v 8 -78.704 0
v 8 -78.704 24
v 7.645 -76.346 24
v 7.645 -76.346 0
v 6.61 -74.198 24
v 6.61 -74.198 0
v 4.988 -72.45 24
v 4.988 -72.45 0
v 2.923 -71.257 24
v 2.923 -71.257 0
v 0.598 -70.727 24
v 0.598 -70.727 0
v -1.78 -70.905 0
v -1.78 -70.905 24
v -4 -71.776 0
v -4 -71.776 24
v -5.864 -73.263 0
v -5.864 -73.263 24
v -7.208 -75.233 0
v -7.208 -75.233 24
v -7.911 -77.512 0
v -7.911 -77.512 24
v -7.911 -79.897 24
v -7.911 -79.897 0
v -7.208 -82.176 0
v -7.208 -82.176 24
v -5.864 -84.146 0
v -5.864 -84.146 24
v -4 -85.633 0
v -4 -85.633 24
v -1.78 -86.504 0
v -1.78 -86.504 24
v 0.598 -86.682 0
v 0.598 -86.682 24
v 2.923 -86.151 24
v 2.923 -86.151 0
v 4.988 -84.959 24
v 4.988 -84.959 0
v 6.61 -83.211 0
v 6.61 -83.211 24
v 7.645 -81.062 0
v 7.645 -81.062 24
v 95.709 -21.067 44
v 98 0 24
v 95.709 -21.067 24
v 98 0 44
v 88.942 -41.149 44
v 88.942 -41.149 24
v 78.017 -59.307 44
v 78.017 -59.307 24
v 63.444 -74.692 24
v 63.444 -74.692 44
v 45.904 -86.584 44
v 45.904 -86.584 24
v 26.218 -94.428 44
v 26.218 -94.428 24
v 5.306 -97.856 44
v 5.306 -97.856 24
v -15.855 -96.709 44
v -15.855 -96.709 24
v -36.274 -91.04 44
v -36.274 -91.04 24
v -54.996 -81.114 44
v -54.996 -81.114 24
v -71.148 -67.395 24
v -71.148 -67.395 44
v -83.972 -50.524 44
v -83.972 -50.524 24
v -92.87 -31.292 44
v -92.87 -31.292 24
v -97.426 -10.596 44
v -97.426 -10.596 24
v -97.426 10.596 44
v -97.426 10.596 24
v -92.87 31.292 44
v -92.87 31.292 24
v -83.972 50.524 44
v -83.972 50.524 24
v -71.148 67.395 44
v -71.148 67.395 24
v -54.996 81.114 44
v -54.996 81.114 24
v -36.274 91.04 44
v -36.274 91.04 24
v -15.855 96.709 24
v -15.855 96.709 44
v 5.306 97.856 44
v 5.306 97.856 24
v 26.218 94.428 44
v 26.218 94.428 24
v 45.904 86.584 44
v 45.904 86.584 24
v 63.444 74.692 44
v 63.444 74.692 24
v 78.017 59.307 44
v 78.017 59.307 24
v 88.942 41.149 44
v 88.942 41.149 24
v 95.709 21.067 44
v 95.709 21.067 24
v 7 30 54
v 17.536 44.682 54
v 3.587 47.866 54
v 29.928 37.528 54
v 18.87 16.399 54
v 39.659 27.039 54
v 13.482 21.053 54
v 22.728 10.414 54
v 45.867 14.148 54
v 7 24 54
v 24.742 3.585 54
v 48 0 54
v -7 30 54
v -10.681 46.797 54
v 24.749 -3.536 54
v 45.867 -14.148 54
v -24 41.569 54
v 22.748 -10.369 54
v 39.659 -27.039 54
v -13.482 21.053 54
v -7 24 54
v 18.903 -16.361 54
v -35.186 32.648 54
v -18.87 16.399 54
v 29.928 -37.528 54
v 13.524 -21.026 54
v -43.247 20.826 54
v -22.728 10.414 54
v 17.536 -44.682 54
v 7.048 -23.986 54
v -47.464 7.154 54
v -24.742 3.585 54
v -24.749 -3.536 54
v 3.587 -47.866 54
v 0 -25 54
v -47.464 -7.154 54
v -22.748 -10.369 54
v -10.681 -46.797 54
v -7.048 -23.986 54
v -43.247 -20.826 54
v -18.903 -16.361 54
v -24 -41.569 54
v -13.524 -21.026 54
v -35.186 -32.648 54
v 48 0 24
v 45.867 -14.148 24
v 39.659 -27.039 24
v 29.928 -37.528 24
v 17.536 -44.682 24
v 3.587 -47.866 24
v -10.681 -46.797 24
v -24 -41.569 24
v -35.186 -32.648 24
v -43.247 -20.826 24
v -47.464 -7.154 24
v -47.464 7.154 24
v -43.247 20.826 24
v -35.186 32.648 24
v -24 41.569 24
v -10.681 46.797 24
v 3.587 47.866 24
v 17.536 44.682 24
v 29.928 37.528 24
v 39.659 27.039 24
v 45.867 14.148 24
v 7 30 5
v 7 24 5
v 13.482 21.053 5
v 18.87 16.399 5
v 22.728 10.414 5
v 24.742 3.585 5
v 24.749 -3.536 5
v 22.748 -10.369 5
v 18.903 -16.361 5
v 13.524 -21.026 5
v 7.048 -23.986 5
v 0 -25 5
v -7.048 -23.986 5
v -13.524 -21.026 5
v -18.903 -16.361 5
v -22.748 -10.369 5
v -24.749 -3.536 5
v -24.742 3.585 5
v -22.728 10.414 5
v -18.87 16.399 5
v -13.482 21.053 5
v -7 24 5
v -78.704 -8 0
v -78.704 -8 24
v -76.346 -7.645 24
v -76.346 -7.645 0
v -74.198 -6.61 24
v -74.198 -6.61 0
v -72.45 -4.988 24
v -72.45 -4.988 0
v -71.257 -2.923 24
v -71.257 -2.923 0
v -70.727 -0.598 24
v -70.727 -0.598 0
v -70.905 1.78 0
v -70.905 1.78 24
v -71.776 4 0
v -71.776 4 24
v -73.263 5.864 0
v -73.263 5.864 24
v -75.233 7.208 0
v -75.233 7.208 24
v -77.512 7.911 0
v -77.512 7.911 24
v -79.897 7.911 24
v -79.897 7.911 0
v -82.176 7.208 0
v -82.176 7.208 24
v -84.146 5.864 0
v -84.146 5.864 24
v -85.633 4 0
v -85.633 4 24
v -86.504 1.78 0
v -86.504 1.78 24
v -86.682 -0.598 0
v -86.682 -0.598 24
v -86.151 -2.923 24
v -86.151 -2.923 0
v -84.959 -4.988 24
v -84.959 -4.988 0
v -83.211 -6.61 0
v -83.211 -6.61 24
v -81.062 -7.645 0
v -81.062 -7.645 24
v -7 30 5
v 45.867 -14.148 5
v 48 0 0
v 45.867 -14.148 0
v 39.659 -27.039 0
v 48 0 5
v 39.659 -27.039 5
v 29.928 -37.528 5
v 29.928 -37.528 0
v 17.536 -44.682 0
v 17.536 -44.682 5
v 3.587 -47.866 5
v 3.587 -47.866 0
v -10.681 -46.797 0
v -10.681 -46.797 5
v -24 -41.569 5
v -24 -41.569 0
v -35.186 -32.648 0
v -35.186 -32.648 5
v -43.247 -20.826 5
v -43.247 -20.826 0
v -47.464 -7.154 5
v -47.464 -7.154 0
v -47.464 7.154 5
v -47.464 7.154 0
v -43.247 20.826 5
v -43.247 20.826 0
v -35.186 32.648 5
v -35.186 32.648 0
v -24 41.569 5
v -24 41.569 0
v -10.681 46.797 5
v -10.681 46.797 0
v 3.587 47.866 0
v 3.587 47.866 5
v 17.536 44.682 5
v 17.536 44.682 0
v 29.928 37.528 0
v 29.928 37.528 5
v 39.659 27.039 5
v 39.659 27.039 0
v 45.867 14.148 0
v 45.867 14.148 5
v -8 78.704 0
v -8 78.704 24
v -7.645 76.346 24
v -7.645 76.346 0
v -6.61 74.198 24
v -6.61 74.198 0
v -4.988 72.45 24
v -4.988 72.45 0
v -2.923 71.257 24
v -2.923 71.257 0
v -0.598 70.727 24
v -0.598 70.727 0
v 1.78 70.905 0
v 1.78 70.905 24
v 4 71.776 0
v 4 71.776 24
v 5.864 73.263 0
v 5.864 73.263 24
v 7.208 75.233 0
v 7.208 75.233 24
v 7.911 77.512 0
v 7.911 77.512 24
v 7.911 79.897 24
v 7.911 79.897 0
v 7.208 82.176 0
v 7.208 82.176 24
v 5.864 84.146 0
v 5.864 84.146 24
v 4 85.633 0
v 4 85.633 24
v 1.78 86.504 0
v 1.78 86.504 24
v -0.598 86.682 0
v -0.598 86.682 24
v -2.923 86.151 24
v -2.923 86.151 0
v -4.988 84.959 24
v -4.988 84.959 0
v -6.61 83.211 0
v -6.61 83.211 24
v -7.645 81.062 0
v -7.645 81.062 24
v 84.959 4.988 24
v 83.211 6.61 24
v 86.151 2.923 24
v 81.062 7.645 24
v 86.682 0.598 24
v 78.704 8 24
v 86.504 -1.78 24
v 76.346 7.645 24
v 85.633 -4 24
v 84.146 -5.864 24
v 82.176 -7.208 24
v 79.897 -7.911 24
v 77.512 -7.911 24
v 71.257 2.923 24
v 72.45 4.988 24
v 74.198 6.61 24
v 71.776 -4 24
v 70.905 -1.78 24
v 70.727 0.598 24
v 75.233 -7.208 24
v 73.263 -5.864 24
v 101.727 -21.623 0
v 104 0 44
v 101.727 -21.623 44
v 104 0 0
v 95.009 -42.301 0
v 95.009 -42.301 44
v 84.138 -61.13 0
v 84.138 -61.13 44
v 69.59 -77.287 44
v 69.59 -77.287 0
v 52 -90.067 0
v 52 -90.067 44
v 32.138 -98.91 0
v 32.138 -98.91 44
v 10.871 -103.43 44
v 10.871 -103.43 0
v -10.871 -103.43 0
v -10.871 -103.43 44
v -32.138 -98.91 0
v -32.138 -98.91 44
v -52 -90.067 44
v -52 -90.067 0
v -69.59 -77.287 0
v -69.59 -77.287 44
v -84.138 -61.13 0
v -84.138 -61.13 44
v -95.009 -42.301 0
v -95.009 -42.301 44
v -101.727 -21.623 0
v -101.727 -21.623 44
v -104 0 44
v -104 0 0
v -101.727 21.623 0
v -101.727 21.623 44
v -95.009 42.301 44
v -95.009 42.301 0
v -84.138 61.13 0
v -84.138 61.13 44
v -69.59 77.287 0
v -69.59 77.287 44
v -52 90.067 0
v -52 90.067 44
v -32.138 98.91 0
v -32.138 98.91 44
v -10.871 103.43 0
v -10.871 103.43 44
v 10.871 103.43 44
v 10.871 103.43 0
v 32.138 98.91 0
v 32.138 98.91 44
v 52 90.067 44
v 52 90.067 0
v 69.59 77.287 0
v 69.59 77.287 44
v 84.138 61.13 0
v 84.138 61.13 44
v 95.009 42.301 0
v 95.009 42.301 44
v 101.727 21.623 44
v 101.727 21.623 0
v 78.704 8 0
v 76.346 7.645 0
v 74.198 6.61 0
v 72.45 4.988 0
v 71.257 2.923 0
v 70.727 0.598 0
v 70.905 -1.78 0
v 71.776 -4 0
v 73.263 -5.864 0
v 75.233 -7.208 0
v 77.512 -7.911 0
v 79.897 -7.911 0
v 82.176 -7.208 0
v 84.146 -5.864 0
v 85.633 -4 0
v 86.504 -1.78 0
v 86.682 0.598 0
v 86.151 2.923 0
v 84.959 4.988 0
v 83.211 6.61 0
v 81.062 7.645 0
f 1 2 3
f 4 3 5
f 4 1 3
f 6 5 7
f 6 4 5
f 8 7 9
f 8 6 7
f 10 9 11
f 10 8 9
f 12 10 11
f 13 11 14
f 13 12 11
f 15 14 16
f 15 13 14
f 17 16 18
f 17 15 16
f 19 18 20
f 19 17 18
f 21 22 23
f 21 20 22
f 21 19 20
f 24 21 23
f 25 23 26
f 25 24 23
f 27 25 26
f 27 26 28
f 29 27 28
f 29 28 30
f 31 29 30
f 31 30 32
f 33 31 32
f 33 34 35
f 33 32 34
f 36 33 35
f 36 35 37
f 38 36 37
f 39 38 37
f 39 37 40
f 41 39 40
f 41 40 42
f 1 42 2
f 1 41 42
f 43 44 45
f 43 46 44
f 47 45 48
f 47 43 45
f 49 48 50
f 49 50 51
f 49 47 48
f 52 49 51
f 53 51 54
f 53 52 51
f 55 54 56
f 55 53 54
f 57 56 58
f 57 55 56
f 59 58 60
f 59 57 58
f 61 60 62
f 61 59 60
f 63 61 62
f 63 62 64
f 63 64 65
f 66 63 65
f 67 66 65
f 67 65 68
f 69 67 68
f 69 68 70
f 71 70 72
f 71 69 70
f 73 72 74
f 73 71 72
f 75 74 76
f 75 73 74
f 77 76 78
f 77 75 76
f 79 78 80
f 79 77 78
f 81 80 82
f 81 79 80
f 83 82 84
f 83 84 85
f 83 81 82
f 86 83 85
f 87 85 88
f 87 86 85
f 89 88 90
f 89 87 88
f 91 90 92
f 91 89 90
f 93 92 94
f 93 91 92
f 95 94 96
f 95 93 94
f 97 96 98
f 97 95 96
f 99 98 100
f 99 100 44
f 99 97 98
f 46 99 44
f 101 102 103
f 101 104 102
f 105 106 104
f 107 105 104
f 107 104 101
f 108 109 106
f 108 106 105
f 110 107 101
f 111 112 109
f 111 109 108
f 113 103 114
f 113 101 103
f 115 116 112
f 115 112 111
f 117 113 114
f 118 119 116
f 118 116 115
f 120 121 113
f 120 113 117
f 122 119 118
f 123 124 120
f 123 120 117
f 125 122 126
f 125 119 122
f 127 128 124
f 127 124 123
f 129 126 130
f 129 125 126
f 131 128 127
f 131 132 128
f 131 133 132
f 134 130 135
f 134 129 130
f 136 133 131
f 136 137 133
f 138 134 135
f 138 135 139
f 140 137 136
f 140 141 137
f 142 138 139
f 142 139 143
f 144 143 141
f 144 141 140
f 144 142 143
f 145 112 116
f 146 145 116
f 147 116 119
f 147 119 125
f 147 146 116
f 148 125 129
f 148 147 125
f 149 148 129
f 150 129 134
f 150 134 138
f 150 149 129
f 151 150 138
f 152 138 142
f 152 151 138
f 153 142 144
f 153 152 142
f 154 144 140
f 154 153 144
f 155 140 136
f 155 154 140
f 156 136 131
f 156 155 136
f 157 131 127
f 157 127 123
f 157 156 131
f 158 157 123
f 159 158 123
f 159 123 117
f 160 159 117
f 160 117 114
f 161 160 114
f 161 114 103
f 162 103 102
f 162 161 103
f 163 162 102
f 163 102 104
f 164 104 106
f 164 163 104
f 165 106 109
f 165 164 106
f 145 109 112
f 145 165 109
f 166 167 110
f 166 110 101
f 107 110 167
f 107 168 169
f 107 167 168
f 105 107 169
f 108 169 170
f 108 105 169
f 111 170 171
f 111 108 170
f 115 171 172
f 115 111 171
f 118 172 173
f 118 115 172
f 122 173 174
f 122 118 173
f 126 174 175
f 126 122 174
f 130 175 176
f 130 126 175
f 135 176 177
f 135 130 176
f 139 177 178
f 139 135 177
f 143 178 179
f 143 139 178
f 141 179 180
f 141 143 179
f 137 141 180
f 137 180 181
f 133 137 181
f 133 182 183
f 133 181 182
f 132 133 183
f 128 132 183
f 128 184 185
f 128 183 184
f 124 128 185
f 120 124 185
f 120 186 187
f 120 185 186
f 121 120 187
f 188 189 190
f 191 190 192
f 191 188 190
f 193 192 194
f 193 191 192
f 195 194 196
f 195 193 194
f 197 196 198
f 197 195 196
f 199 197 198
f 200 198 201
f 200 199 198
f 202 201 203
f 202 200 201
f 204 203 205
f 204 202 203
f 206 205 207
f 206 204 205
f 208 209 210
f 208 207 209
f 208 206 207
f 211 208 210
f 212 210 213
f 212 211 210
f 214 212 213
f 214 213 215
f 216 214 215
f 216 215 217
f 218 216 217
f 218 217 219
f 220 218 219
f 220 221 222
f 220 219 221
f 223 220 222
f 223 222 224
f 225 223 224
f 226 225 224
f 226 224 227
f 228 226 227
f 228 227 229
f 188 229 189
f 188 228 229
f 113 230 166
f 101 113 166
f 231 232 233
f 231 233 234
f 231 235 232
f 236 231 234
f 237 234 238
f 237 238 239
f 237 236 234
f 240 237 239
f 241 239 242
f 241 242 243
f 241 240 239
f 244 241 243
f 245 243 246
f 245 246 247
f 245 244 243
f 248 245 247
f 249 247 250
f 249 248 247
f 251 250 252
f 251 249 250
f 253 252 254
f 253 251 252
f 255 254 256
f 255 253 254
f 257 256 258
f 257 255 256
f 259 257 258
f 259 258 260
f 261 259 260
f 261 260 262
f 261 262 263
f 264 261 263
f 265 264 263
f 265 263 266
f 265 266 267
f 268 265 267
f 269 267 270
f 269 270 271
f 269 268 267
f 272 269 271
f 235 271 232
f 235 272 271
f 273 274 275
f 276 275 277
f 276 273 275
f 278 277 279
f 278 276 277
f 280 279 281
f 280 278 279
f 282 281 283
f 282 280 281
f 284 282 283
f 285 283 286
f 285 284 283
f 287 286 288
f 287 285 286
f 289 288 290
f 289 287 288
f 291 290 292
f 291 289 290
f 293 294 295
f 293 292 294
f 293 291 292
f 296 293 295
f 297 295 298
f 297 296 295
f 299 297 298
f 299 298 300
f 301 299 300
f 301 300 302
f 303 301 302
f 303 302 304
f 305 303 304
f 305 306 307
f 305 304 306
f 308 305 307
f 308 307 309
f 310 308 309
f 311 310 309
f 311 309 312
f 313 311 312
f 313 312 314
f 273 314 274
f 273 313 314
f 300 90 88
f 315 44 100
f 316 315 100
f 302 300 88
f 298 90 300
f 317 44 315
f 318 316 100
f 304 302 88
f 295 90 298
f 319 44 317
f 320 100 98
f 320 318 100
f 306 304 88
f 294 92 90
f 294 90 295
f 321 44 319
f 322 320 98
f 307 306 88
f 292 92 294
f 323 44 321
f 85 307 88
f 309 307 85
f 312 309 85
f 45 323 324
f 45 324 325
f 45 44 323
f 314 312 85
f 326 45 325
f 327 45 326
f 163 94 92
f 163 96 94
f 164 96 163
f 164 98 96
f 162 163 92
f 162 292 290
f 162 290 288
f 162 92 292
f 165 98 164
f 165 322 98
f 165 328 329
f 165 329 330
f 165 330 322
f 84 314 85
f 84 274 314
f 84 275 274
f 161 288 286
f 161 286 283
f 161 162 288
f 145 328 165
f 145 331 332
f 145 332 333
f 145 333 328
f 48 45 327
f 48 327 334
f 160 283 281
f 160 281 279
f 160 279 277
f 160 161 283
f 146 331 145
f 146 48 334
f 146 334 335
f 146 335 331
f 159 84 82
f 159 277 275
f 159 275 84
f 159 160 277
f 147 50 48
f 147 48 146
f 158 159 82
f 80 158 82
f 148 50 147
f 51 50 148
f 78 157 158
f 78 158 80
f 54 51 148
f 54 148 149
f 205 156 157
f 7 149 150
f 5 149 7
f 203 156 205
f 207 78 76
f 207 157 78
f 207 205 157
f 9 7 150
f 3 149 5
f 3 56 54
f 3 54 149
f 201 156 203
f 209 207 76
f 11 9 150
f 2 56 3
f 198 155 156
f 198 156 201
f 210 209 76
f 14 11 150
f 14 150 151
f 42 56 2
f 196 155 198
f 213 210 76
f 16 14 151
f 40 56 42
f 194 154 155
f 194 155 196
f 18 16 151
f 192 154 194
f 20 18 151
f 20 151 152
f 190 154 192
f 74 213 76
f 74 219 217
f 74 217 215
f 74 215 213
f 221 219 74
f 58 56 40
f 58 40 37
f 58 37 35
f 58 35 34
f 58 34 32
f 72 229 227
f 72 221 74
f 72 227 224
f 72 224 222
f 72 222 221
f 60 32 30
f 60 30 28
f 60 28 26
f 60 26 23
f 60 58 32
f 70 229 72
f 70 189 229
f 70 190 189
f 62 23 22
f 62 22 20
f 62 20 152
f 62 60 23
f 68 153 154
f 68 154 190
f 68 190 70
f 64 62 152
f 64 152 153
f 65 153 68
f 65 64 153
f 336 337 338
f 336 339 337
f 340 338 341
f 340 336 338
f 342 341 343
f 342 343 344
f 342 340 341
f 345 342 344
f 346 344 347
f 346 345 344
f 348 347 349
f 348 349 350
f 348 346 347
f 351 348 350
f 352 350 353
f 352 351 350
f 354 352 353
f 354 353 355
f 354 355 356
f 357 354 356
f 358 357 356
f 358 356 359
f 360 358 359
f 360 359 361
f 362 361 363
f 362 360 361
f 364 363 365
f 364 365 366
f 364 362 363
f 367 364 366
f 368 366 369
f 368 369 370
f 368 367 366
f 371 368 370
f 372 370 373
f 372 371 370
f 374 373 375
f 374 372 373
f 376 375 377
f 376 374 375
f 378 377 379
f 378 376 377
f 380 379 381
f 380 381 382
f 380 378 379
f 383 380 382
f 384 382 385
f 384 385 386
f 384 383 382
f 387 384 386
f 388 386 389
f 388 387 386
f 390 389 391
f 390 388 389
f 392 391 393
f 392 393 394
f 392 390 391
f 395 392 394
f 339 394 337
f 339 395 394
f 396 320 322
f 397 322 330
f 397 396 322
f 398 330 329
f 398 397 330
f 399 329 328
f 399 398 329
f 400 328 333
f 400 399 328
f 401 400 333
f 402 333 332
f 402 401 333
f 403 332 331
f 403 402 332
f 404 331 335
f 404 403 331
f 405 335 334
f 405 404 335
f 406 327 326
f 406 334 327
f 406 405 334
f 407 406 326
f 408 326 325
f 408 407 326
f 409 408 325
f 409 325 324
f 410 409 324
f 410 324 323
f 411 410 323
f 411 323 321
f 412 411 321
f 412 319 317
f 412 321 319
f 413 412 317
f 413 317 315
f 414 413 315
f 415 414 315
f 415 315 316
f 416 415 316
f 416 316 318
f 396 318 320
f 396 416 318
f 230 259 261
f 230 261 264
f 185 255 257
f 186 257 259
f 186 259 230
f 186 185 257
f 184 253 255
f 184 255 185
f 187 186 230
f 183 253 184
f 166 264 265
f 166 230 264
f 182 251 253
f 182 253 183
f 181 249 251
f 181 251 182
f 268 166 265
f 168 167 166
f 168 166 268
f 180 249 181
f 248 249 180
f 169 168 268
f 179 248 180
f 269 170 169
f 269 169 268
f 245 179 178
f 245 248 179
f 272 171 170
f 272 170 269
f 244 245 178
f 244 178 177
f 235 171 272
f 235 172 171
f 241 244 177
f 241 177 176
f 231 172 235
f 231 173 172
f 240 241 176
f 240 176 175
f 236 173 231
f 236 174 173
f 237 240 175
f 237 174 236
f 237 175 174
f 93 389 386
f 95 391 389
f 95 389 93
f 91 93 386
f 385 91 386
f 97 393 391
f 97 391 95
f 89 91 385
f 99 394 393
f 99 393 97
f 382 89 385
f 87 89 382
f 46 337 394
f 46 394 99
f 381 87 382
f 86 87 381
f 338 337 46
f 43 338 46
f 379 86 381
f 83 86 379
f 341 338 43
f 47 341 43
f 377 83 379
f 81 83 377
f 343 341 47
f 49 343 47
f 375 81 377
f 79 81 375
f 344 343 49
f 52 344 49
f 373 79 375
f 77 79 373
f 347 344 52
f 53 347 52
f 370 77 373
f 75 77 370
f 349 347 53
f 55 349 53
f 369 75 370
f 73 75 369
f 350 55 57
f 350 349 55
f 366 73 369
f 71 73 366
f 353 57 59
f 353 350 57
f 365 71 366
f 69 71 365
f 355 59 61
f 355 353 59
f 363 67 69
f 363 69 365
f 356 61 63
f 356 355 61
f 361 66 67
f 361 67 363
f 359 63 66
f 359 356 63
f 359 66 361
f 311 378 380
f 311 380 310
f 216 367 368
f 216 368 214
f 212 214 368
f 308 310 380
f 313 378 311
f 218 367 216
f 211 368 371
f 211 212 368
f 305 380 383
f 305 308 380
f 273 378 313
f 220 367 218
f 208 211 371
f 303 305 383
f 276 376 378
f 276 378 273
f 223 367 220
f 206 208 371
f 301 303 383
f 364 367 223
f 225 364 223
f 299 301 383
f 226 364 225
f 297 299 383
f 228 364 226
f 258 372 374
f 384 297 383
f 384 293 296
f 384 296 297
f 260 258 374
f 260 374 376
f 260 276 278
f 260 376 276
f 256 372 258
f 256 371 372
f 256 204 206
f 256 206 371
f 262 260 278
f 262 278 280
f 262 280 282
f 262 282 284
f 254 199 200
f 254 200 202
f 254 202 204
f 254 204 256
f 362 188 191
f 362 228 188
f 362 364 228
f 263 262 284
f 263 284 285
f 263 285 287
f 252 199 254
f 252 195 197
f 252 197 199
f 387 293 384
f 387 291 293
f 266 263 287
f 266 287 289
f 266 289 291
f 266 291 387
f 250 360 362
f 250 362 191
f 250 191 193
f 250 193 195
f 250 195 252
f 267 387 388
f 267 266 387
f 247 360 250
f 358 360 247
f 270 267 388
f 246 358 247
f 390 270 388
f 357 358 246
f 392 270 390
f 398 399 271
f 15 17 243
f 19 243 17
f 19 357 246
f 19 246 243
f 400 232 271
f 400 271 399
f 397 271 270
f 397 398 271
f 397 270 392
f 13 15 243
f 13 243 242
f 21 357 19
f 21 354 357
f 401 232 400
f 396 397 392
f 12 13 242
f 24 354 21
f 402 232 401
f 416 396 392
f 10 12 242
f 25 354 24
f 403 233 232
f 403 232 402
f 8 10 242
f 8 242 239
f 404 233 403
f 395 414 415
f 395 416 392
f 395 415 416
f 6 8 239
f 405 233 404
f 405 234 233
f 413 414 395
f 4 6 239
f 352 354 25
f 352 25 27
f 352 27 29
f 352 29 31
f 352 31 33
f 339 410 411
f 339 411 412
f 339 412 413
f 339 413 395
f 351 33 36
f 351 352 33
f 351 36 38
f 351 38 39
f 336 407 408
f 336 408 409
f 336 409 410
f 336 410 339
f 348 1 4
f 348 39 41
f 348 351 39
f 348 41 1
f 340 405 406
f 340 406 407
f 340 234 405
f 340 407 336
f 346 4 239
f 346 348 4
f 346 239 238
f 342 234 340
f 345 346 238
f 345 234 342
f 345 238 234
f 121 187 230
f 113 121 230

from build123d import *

# Parameters (mm, degrees)
SKETCH2_W          = 14
SKETCH2_H          = 10
CUT_EXTRUDE1_DEPTH = 146
SKETCH3_R          = 8
CUT_EXTRUDE2_DEPTH = 217
CIRPATTERN1_COUNT  = 4


with BuildPart() as part:
    # Sketch1 → Revolve1 (revolve)
    with BuildSketch(Plane(origin=(0, 0, 0), x_dir=(0, 0, -1), z_dir=(1, 0, 0)), mode=Mode.PRIVATE) as revolve1_sk:
        Polygon((-44, 104), (0, 104), (0, 48), (-5, 48), (-5, 25), (-54, 25), (-54, 48), (-24, 48), (-24, 98), (-44, 98), align=None)
    revolve(revolve1_sk.sketch.rotate(Axis((0, 0, 52.496471852), (0, 0, -1)), 90), axis=Axis((0, 0, 52.496471852), (0, 0, -1)))

    # Sketch2 → Cut-Extrude1 (cut)
    with BuildSketch(Plane.XY):
        with Locations((0, 25)):
            Rectangle(SKETCH2_W, SKETCH2_H)
    extrude(amount=CUT_EXTRUDE1_DEPTH, mode=Mode.SUBTRACT)

    # Sketch3 → Cut-Extrude2 (cut)
    with BuildSketch(Plane.XY):
        with Locations(Location((0, 78.704447468, 0), (0, 0, 180))):
            Circle(SKETCH3_R)
    cut_extrude2 = extrude(amount=CUT_EXTRUDE2_DEPTH, mode=Mode.SUBTRACT)

    # CirPattern1: Cut-Extrude2 ×4 about axis
    cirpattern1_axis = Axis((0, 0, 0), (0, 0, 1))
    for i in range(1, CIRPATTERN1_COUNT):
        add(cut_extrude2.rotate(cirpattern1_axis, i * 360 / CIRPATTERN1_COUNT), mode=Mode.SUBTRACT)


solid = part.part
